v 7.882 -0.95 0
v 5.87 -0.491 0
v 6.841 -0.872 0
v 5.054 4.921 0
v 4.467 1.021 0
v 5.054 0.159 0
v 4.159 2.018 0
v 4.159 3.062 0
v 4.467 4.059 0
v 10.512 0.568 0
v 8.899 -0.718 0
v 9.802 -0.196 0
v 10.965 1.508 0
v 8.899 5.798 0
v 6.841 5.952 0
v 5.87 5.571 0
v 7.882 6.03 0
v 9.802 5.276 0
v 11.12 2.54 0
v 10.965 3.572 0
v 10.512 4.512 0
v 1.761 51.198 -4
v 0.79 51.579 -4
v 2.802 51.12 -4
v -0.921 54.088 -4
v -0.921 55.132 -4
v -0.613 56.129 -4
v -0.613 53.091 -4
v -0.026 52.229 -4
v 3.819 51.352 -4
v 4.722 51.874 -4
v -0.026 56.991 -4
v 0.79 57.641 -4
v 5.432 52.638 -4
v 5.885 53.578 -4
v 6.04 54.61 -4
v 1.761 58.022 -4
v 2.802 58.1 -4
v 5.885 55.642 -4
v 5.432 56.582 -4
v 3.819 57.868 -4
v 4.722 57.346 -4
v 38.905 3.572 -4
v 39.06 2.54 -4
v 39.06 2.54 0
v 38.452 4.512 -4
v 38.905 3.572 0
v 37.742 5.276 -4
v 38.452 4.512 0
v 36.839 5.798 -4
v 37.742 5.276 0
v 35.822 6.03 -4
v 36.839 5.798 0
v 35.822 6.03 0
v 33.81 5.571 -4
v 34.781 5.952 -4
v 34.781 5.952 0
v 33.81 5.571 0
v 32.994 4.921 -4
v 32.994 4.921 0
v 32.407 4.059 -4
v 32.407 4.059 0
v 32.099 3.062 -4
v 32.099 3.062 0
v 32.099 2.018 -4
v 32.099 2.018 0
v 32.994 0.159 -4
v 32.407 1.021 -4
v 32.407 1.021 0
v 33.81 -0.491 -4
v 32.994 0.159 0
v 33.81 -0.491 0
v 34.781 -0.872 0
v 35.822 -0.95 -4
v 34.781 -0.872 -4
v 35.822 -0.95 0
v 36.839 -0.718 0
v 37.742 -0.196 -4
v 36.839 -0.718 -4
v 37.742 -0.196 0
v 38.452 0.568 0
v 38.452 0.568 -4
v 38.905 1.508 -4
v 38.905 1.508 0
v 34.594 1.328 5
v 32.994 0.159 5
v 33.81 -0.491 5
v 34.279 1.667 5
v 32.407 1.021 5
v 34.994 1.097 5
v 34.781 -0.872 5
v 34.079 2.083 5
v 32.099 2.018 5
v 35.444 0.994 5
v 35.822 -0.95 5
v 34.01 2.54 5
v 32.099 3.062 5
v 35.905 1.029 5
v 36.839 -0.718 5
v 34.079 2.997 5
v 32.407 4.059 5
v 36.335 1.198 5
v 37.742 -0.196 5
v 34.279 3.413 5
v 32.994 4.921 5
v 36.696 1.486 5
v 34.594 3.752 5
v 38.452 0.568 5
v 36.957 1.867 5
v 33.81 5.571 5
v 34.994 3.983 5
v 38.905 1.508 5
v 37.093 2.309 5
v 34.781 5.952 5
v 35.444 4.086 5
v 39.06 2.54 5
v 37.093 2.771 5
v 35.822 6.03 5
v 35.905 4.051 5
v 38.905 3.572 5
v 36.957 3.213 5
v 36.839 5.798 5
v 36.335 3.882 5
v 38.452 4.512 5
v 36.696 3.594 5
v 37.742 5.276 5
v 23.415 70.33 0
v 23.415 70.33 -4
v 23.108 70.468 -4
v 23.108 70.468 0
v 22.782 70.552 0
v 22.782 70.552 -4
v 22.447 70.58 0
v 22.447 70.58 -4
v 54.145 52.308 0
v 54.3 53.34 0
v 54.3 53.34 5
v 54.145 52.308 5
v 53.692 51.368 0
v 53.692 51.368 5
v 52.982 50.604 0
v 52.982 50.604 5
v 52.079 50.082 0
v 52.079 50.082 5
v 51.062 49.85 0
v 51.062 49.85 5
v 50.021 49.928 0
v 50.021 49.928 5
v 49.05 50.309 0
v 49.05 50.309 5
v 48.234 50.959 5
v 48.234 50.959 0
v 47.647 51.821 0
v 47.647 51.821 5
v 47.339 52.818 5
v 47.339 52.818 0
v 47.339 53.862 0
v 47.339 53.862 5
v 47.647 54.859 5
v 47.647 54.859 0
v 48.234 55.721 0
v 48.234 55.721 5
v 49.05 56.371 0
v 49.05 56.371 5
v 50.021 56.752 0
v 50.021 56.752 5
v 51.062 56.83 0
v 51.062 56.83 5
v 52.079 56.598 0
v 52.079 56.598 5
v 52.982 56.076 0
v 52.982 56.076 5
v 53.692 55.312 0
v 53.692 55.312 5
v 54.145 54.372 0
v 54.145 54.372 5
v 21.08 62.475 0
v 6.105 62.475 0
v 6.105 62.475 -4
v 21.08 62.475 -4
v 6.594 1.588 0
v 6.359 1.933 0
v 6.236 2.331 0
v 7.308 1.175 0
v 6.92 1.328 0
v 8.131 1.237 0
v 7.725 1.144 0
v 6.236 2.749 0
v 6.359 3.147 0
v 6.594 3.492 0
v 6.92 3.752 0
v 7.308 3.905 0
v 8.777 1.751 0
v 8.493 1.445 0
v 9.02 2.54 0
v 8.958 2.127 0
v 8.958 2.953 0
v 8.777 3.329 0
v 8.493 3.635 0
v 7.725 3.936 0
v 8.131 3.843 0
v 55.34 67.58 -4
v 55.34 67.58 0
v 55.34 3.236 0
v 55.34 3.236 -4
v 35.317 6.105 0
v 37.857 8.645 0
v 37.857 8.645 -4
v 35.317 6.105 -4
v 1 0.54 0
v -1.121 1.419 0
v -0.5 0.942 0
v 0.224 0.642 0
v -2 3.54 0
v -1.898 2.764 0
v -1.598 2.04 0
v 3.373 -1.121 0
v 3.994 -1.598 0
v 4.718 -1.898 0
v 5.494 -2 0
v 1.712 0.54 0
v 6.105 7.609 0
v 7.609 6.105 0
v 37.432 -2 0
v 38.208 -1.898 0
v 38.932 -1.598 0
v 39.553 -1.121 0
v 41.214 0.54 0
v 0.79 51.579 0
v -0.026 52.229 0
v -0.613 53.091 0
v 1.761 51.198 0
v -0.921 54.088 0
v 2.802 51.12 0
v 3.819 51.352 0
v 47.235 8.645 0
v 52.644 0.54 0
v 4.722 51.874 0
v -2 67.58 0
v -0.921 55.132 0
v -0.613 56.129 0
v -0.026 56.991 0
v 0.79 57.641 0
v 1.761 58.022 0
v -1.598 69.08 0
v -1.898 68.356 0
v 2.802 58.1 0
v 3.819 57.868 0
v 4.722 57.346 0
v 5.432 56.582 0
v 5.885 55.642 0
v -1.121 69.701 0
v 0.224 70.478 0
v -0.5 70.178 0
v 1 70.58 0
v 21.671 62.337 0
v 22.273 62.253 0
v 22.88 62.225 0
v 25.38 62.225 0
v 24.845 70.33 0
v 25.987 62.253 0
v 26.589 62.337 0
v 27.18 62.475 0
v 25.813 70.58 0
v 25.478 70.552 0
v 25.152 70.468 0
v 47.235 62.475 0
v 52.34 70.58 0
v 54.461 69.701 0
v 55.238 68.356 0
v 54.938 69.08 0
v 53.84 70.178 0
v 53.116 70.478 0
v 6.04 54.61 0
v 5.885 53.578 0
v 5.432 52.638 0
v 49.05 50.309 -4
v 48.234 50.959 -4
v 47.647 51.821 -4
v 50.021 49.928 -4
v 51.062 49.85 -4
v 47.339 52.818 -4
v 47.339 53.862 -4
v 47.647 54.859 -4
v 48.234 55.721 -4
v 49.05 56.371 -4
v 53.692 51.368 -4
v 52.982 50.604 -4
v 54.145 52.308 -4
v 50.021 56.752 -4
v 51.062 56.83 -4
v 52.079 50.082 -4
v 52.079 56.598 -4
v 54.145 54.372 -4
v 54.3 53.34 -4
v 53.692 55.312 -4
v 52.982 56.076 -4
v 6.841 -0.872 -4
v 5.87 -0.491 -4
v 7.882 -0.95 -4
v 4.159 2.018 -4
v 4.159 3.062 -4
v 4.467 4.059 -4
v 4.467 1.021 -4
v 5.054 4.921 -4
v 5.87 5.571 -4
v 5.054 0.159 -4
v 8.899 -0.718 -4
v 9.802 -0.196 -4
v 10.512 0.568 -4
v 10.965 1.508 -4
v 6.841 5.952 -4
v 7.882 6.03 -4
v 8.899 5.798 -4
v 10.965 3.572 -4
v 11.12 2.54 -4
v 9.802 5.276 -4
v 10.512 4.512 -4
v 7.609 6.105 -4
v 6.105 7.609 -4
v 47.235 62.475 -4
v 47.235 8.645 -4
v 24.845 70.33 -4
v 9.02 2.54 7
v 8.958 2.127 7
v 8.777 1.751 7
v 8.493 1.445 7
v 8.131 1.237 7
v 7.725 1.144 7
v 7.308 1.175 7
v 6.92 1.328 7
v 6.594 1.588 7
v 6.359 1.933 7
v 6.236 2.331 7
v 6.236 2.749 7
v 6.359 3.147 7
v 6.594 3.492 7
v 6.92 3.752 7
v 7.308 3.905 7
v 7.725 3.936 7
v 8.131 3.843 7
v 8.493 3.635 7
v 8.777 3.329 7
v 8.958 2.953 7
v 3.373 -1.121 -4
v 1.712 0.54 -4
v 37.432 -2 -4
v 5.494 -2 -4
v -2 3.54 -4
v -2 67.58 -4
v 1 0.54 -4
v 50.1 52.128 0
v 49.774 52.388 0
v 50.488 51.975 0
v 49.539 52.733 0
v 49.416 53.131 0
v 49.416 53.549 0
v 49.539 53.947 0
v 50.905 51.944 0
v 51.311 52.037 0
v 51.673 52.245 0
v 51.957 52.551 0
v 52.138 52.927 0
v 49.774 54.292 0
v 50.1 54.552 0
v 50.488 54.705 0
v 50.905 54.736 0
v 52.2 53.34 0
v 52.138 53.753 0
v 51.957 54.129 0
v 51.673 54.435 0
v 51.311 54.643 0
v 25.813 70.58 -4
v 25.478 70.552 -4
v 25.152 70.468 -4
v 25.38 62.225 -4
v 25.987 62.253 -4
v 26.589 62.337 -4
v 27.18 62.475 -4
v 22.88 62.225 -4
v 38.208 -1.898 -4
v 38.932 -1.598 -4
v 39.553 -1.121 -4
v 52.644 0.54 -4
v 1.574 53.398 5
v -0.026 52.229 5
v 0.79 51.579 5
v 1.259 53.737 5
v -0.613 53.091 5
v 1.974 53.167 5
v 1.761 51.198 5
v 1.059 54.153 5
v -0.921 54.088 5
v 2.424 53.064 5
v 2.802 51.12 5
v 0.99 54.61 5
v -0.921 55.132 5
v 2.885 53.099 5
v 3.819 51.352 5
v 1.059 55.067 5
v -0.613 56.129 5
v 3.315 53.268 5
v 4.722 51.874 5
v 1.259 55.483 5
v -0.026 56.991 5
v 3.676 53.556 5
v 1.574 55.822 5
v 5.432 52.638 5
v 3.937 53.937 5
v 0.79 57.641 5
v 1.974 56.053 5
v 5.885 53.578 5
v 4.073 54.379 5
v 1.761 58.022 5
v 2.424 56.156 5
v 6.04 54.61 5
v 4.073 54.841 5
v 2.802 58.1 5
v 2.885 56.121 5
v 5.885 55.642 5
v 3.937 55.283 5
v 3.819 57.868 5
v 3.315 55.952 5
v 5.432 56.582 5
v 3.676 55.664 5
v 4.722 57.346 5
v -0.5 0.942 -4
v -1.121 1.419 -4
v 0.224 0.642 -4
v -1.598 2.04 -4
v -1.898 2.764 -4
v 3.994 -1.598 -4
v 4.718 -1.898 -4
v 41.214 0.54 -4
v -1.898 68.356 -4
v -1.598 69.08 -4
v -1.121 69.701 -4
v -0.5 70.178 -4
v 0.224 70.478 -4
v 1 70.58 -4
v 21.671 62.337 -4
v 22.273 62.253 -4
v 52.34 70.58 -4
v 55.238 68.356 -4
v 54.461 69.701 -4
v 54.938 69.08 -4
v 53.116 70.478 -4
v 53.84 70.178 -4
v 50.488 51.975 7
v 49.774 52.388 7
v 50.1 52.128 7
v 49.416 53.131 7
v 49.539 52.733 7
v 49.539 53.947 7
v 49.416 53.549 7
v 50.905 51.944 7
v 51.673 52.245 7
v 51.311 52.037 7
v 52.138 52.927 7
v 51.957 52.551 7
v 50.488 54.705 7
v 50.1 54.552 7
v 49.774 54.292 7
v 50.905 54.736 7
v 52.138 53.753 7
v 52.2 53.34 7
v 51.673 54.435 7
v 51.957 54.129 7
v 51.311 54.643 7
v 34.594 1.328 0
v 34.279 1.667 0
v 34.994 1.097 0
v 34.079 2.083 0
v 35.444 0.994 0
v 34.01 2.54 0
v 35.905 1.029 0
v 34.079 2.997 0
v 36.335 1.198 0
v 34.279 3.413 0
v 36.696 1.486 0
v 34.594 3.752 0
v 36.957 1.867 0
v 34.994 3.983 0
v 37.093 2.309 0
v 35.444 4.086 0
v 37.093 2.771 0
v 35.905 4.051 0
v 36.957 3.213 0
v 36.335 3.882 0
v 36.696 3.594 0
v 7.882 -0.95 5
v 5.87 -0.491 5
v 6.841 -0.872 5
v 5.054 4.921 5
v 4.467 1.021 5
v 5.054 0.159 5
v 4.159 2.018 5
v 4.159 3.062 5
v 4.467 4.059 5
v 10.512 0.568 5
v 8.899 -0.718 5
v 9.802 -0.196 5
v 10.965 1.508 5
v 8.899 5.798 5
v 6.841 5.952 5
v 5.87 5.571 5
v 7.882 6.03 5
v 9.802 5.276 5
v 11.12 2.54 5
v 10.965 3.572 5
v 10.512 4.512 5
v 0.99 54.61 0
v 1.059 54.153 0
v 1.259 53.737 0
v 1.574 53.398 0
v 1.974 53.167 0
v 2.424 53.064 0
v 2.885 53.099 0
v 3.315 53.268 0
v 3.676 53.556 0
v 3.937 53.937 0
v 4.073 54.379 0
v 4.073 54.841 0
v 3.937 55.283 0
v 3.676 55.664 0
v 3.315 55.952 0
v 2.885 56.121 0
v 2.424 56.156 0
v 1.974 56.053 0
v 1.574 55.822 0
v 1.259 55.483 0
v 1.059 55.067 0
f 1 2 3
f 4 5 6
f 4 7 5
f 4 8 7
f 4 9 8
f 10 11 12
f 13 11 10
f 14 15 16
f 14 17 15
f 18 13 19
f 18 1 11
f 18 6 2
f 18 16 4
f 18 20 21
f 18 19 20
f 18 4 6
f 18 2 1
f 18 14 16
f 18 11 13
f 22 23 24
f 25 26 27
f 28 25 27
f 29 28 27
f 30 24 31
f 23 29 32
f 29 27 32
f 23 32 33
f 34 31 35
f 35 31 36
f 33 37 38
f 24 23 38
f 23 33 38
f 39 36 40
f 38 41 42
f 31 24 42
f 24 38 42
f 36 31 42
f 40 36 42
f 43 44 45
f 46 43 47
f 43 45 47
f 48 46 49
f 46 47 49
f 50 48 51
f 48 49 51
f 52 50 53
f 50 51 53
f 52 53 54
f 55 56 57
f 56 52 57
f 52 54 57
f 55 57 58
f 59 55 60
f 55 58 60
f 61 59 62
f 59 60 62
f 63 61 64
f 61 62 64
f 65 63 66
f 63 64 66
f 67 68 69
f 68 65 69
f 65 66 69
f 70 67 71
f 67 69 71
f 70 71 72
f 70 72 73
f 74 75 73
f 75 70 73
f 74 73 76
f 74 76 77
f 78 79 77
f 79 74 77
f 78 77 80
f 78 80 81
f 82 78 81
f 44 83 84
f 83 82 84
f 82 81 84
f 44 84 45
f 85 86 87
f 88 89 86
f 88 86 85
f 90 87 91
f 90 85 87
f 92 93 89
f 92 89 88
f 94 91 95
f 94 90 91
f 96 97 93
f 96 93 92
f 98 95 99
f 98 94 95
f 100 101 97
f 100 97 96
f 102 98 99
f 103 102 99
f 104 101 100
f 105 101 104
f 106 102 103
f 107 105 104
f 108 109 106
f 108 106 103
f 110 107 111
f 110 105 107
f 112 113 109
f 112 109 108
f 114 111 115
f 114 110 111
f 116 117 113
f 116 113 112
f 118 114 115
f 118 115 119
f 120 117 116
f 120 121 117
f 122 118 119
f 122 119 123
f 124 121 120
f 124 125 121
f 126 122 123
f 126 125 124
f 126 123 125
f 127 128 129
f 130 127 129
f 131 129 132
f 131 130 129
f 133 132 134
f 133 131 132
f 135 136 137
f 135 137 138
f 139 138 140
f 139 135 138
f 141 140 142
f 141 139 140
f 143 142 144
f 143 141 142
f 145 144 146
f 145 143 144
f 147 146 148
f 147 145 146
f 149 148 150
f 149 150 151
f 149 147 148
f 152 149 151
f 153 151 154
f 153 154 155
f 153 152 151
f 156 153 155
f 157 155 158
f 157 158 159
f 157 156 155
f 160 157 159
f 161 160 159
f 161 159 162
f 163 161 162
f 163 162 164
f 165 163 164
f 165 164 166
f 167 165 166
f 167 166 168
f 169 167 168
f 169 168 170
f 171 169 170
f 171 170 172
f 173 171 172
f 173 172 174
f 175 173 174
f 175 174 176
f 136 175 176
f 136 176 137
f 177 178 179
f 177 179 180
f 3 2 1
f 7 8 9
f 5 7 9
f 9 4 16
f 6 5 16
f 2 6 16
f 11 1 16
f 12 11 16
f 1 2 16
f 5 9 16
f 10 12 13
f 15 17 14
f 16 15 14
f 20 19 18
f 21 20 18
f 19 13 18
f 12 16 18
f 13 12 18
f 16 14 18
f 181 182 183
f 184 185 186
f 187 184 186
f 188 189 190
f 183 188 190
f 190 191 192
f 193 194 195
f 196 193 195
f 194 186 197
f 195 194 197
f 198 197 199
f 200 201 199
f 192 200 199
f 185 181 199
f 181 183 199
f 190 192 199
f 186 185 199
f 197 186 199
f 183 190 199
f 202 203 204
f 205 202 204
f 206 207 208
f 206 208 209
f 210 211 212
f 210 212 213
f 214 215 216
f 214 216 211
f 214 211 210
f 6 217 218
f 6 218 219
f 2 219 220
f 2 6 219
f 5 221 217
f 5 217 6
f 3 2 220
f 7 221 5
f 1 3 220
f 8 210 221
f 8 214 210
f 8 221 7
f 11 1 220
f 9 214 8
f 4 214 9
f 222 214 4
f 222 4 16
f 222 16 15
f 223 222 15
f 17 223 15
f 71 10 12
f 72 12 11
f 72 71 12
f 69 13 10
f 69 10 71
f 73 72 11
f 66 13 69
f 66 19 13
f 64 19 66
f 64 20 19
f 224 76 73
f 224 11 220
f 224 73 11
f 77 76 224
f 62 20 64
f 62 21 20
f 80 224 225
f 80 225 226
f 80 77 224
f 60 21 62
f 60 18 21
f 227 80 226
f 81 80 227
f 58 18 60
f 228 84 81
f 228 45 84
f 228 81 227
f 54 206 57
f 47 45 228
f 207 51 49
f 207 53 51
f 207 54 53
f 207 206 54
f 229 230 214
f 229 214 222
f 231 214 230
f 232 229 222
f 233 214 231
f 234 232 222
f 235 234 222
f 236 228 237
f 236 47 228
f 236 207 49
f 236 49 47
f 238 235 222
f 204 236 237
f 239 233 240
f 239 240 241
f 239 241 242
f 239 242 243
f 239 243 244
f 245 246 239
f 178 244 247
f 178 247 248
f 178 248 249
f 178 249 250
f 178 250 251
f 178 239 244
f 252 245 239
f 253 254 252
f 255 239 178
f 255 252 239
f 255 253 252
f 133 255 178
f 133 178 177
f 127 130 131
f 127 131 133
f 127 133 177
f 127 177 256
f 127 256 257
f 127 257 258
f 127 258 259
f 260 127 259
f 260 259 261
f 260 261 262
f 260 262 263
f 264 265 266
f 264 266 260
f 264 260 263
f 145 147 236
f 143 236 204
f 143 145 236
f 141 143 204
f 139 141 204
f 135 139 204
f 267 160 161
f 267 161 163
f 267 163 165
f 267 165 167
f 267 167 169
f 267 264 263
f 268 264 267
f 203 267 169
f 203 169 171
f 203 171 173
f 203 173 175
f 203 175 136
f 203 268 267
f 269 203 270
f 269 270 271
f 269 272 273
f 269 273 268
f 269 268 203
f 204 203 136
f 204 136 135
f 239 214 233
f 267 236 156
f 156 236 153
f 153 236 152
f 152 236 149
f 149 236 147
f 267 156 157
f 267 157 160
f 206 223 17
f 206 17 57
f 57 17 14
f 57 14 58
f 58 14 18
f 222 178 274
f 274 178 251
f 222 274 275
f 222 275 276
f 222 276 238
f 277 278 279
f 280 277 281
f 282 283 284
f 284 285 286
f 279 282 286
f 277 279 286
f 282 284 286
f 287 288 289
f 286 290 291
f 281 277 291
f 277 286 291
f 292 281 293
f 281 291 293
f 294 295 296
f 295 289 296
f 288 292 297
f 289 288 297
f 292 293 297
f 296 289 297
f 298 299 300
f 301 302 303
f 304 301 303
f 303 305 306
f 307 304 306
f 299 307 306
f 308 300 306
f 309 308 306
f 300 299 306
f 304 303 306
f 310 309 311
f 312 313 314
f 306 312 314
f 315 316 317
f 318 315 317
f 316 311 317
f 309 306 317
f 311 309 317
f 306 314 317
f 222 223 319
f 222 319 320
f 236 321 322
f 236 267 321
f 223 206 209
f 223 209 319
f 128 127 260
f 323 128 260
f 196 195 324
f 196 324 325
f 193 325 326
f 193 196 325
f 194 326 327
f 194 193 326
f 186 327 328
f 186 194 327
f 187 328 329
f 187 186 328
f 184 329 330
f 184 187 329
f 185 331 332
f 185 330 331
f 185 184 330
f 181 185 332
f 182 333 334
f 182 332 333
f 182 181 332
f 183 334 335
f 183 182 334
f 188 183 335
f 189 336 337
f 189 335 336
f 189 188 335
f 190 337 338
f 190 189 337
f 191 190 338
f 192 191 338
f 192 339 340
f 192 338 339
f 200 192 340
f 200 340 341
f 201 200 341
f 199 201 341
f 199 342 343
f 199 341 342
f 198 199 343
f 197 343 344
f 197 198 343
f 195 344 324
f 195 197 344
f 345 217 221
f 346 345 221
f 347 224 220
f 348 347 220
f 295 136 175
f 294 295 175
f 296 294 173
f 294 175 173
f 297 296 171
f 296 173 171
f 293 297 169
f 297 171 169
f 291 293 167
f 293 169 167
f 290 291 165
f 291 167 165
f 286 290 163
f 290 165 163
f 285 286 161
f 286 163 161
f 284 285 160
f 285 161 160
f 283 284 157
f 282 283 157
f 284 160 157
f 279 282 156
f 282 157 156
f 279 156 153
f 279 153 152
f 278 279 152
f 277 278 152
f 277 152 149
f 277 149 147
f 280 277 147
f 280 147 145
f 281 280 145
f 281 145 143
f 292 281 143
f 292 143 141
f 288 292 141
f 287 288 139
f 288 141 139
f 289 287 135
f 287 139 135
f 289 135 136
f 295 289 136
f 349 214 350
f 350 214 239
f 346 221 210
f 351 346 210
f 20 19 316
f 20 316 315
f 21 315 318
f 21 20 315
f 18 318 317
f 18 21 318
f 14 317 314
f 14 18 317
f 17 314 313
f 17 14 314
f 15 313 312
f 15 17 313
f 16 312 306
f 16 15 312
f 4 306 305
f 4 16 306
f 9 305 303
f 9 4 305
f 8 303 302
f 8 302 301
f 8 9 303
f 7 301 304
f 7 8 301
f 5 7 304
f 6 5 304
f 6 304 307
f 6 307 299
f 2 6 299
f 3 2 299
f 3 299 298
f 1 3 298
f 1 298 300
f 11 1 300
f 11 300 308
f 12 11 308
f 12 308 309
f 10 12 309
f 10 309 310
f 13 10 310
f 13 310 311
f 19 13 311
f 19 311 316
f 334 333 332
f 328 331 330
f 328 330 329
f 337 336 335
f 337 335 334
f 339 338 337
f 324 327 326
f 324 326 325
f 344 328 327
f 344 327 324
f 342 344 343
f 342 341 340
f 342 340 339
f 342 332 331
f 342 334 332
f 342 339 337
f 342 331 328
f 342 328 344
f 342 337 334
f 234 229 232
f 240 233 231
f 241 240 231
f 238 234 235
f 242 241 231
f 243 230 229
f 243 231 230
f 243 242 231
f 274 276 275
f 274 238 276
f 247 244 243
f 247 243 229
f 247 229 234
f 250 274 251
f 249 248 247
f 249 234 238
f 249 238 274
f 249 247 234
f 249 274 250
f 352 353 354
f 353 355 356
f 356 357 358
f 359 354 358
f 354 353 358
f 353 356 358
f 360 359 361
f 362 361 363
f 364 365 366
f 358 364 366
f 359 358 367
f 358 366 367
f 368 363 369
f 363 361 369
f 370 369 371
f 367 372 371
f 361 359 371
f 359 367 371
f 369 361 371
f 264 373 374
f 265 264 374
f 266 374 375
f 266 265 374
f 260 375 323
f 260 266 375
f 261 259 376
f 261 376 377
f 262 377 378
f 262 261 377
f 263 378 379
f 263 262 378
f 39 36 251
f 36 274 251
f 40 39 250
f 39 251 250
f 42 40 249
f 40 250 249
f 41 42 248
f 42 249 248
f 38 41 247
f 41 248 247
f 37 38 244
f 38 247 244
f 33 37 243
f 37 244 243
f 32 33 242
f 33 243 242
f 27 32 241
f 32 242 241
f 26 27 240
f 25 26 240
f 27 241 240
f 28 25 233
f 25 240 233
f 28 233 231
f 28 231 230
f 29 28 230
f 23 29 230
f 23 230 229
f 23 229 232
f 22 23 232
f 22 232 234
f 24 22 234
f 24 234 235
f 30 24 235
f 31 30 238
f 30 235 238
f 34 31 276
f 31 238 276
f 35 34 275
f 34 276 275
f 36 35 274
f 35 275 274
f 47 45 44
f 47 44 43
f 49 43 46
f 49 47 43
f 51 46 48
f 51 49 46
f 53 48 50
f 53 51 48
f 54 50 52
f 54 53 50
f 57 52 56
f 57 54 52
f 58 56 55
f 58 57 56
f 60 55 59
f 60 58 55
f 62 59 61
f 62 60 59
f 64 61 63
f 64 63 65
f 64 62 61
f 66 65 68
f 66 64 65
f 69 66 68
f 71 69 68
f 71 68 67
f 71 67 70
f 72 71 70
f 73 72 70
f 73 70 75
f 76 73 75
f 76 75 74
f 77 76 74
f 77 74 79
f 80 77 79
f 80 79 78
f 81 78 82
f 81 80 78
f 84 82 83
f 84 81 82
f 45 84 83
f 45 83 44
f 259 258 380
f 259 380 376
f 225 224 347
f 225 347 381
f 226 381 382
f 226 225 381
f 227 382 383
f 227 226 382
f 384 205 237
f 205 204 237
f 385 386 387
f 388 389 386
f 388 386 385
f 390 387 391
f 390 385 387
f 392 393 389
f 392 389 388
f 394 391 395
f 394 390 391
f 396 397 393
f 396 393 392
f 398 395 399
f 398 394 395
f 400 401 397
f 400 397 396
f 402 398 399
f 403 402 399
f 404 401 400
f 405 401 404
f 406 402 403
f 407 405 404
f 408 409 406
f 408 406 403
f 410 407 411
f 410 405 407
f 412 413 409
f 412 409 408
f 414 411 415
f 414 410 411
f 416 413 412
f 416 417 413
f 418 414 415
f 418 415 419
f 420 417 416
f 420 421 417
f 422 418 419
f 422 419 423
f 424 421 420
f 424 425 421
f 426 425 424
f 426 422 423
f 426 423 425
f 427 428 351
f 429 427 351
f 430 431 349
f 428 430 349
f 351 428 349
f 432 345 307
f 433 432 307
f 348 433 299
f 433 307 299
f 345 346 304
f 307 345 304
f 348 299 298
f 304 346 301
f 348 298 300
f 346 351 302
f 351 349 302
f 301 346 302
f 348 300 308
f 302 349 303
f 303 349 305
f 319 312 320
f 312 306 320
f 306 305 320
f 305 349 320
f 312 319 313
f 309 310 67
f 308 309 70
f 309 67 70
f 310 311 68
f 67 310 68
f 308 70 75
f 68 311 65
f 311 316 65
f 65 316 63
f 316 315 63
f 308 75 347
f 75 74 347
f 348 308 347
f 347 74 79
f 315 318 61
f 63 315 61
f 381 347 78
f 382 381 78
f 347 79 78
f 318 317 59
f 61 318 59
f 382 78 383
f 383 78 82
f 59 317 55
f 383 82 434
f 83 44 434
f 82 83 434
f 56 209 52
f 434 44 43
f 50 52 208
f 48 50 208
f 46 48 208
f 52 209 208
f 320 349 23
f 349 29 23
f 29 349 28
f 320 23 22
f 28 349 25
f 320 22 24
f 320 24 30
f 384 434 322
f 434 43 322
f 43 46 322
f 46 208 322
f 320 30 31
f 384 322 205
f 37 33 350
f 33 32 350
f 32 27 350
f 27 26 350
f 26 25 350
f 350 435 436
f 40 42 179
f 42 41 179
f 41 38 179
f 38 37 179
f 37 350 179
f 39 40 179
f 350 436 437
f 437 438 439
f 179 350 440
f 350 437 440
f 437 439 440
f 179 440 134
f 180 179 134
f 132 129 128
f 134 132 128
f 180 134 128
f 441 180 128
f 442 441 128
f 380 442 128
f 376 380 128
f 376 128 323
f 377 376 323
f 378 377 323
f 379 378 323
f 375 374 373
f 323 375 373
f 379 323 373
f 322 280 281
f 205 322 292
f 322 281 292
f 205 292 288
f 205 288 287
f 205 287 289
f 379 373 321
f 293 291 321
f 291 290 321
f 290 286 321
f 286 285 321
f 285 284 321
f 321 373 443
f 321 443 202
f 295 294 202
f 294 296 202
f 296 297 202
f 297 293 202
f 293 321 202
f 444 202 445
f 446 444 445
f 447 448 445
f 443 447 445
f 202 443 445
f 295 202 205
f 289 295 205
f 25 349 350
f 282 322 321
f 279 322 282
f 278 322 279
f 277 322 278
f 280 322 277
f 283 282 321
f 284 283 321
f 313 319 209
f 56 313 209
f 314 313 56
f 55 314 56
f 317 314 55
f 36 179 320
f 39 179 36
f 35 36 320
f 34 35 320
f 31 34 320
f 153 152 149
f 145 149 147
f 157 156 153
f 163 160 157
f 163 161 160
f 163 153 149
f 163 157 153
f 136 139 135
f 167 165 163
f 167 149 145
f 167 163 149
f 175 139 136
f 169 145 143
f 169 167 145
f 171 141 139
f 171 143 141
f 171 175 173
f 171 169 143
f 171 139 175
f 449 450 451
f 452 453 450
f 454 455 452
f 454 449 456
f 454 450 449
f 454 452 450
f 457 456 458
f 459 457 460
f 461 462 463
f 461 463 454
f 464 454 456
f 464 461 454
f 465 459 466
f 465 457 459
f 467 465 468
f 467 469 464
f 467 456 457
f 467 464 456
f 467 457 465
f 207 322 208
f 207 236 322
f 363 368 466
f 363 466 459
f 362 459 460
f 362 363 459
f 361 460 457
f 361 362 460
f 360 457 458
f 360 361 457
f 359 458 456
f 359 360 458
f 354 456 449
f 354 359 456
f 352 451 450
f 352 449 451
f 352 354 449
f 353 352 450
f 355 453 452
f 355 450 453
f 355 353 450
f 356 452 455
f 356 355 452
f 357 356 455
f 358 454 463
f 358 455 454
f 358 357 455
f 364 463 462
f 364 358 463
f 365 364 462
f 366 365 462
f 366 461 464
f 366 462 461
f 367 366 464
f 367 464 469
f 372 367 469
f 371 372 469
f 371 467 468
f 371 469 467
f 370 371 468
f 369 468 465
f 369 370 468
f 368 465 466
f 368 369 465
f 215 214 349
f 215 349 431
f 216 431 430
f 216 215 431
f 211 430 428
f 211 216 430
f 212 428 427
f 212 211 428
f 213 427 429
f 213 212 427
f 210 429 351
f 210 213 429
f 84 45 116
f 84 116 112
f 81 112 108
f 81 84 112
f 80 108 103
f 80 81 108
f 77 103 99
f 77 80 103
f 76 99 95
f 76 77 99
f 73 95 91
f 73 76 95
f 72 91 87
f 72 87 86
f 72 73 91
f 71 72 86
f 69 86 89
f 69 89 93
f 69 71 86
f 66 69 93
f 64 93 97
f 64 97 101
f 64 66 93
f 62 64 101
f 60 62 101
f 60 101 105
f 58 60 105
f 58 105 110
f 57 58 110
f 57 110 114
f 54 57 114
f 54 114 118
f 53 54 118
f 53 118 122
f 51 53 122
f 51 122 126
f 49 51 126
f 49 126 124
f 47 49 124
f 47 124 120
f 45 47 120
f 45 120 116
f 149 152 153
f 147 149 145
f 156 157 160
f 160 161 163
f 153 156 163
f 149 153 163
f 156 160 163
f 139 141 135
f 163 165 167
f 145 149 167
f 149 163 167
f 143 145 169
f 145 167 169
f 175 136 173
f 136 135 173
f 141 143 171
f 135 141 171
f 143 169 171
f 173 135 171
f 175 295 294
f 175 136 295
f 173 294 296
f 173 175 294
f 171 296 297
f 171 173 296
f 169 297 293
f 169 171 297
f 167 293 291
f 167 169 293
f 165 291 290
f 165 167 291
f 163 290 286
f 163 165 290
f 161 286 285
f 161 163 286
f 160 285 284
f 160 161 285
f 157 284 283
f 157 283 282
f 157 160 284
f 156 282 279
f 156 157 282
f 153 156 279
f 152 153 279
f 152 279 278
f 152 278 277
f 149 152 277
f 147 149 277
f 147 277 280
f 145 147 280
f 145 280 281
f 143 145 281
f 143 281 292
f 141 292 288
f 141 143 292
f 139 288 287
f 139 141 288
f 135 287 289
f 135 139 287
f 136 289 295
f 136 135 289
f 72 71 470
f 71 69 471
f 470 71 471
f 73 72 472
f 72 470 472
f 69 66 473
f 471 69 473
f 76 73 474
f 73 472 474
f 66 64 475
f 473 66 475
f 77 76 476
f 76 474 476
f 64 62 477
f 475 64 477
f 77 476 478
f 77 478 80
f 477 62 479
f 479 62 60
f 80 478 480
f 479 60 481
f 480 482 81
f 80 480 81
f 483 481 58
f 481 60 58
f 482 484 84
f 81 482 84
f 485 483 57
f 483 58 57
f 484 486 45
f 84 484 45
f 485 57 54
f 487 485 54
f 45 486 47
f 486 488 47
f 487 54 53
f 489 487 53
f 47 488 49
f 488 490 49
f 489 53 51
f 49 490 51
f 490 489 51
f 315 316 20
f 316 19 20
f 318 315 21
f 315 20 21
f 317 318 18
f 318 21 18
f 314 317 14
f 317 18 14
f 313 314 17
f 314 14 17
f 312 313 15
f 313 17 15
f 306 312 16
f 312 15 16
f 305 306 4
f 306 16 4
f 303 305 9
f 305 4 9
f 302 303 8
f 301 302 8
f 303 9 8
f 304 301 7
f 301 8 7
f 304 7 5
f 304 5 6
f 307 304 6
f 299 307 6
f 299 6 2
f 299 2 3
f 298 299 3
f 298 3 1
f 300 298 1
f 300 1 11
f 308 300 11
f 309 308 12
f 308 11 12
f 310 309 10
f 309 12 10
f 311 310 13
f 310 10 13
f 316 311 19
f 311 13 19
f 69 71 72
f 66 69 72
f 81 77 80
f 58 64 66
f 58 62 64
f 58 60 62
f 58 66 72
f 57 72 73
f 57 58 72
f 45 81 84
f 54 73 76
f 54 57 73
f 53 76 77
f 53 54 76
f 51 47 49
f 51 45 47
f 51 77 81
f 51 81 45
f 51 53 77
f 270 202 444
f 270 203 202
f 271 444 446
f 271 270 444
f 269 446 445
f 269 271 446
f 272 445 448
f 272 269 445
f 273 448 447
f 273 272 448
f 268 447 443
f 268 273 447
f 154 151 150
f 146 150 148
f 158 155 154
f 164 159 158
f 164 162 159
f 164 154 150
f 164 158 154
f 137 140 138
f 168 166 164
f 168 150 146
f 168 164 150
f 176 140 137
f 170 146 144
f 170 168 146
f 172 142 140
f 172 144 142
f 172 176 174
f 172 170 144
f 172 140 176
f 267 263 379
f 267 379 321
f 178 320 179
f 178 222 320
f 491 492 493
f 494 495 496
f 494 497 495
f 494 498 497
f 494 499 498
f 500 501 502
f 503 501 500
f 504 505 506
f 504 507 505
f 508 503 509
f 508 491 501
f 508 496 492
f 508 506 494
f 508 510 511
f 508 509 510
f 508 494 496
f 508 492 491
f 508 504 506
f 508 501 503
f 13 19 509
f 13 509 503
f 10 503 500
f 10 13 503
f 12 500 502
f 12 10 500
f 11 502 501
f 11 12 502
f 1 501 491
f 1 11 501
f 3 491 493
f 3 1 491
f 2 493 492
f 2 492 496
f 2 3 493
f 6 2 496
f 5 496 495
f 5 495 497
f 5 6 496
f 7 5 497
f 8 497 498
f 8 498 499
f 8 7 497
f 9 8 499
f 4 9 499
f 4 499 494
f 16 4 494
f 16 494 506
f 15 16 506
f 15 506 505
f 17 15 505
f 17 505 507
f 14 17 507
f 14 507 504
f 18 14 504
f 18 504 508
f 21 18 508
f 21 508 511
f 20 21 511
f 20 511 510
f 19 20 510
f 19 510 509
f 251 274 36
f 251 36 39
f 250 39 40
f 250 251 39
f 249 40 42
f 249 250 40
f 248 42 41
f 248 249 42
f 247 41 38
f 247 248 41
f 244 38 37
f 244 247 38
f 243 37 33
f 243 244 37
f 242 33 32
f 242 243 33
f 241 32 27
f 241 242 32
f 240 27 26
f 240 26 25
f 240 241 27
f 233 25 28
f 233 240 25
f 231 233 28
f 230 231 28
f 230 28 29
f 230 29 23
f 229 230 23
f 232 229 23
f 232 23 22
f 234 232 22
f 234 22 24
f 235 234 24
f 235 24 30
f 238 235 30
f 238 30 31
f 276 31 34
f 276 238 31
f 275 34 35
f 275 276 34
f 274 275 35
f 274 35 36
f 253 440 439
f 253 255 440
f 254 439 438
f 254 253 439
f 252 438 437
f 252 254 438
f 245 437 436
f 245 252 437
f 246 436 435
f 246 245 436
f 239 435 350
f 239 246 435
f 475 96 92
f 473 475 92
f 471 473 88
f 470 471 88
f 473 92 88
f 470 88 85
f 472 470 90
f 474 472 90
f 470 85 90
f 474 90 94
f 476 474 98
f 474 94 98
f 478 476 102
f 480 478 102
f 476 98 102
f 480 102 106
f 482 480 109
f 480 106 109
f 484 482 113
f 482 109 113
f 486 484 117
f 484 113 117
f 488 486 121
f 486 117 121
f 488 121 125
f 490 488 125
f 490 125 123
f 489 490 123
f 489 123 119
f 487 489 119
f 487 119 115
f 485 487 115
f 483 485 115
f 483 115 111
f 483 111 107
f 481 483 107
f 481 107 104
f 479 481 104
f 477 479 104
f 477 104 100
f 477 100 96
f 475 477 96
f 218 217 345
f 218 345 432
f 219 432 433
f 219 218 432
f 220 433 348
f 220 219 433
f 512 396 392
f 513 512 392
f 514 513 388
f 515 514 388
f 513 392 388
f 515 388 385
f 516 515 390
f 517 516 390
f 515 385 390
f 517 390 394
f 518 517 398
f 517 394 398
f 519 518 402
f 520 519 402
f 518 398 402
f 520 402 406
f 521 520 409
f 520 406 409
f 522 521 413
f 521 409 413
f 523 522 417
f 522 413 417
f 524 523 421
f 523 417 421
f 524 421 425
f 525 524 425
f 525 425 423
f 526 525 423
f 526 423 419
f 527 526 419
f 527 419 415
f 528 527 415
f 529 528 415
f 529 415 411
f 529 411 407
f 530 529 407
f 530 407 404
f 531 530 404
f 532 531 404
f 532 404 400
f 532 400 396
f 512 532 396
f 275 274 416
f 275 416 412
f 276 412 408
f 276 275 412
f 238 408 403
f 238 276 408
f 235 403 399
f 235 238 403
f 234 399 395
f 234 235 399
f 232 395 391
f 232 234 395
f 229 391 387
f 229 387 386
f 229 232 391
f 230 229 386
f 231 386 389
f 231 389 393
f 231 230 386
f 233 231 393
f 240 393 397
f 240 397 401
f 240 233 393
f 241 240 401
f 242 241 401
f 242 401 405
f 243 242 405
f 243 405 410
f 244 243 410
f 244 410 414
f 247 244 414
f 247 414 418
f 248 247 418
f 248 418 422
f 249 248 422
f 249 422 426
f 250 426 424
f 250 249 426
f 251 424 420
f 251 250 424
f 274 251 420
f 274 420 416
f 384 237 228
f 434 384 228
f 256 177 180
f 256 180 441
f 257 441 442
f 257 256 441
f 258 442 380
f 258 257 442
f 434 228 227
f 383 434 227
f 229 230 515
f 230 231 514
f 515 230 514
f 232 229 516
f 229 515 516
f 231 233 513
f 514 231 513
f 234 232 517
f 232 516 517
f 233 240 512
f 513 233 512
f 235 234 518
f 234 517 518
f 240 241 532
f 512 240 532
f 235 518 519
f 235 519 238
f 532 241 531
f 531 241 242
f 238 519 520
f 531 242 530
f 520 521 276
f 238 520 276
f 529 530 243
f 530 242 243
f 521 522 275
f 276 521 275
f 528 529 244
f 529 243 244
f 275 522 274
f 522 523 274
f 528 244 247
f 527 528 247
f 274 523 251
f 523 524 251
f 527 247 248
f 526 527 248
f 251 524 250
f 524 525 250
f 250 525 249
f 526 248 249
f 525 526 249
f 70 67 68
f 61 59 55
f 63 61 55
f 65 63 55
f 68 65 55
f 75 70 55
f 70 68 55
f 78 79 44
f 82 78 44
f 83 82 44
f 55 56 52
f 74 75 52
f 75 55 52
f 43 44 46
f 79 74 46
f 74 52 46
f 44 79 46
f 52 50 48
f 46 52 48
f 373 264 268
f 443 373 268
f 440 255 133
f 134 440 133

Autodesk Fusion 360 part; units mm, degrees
sketch "Sketch1" plane through (0, 0, 0) normal (0, 0, 1) x (1, 0, 0)
  arc A0 (38.1389, 0.2929) -> (37.4318, 0) centre (37.4318, 1) cw
  line L0 (53.34, 67.58) -> (53.34, 4.064)
  arc A1 (22.447, 68.58) -> (22.88, 68.33) centre (22.88, 68.83) ccw
  line L1 (25.813, 68.58) -> (52.34, 68.58)
  line L2 (1, 68.58) -> (22.447, 68.58)
  line L3 (0, 3.54) -> (0, 67.58)
  arc A2 (5.4942, 0) -> (4.7871, 0.2929) centre (5.4942, 1) cw
  line L4 (40.386, 2.54) -> (38.1389, 0.2929)
  line L5 (4.7871, 0.2929) -> (2.54, 2.54)
  line L6 (22.88, 68.33) -> (25.38, 68.33)
  line L7 (37.4318, 0) -> (5.4942, 0)
  line L8 (2.54, 2.54) -> (1, 2.54)
  arc A3 (52.34, 68.58) -> (53.34, 67.58) centre (52.34, 67.58) cw
  line L9 (51.816, 2.54) -> (40.386, 2.54)
  arc A4 (0, 67.58) -> (1, 68.58) centre (1, 67.58) cw
  arc A5 (25.38, 68.33) -> (25.813, 68.58) centre (25.38, 68.83) ccw
  line L10 (53.34, 4.064) -> (51.816, 2.54)
  arc A6 (1, 2.54) -> (0, 3.54) centre (1, 3.54) cw
  circle A7 centre (2.54, 54.61) radius 1.55
  circle A8 centre (50.8, 53.34) radius 1.4
  circle A9 centre (35.56, 2.54) radius 1.55
  circle A10 centre (7.62, 2.54) radius 1.4
  line L11 (23.4152, 70.33) -> (24.8448, 70.33)
  arc A11 (25.813, 70.58) -> (24.8448, 70.33) centre (25.813, 68.58) ccw
  line L12 (25.813, 70.58) -> (52.34, 70.58)
  arc A12 (55.34, 67.58) -> (52.34, 70.58) centre (52.34, 67.58) ccw
  line L13 (55.34, 67.58) -> (55.34, 3.2356)
  line L14 (55.34, 3.2356) -> (52.6444, 0.54)
  line L15 (52.6444, 0.54) -> (41.2144, 0.54)
  line L16 (41.2144, 0.54) -> (39.5531, -1.1213)
  arc A13 (37.4318, -2) -> (39.5531, -1.1213) centre (37.4318, 1) ccw
  line L17 (37.4318, -2) -> (5.4942, -2)
  arc A14 (3.3729, -1.1213) -> (5.4942, -2) centre (5.4942, 1) ccw
  line L18 (3.3729, -1.1213) -> (1.7116, 0.54)
  line L19 (1.7116, 0.54) -> (1, 0.54)
  arc A15 (-2, 3.54) -> (1, 0.54) centre (1, 3.54) ccw
  line L20 (-2, 3.54) -> (-2, 67.58)
  arc A16 (1, 70.58) -> (-2, 67.58) centre (1, 67.58) ccw
  line L21 (1, 70.58) -> (22.447, 70.58)
  arc A17 (23.4152, 70.33) -> (22.447, 70.58) centre (22.447, 68.58) ccw
  circle A18 centre (50.8, 53.34) radius 3.5
  circle A19 centre (35.56, 2.54) radius 3.5
  circle A20 centre (7.62, 2.54) radius 3.5
  circle A21 centre (2.54, 54.61) radius 3.5
  line L22 (47.2351, 62.4751) -> (47.2351, 8.6449)
  line L23 (47.2351, 8.6449) -> (37.8573, 8.6449)
  line L24 (37.8573, 8.6449) -> (35.3173, 6.1049)
  line L25 (35.3173, 6.1049) -> (7.6087, 6.1049)
  line L26 (7.6087, 6.1049) -> (6.1049, 7.6087)
  line L27 (6.1049, 7.6087) -> (6.1049, 62.4751)
  line L28 (6.1049, 62.4751) -> (21.08, 62.4751)
  arc A22 (21.08, 62.4751) -> (22.88, 62.2251) centre (22.88, 68.83) ccw
  line L29 (22.88, 62.2251) -> (25.38, 62.2251)
  arc A23 (25.38, 62.2251) -> (27.18, 62.4751) centre (25.38, 68.83) ccw
  line L30 (27.18, 62.4751) -> (47.2351, 62.4751)
  dimension "d1" = 3.1
  dimension "d2" = 2.8
  dimension "d3" = 2.8
  dimension "d8" = -2
  dimension "d9" = 7
  dimension "d10" = 7
  dimension "d11" = 3.1
  dimension "d12" = 7
  dimension "d13" = 7
  dimension "d14" = 6.1049
extrude "Extrude2" add sketch "Sketch1" along normal blind 5 contours A0 L4 L7 A19 | A0 L4 L7 A19 | A2 L7 A20 | A2 L7 A20 | L0 A18 | L0 A18 | L3 A21 | L3 A21 | A7 | A8 | A9 | A10 makes body 1 at (11.1156, 2.7145, 1.6667) makes body 2 at (6.0226, 54.2615, 1.6667) makes body 3 at (39.0426, 2.8885, 3.3333) makes body 4 at (54.2826, 53.6885, 3.3333)
extrude "Extrude3" add sketch "Sketch1" along normal blind 7 separate body contours A8 | A10 makes body 5 at (49.6054, 52.61, 4.6667) makes body 6 at (9.0183, 2.4702, 4.6667)
extrude "Extrude4" add sketch "Sketch1" against normal blind 4 separate body contours L0 A1 L1 L2 L3 A2 L4 L5 L6 L7 L8 A3 L9 A4 A5 L10 A6 A18 A19 A20 A21 | L11 A11 L12 A12 L13 L14 L15 L16 A13 L17 A14 L18 L19 A15 L20 A16 L21 A17 makes body 7
sketch "Sketch2" plane through (0, 0, 5) normal (0, 0, 1) x (-1, 0, 0)
  circle A0 centre (-2.54, -54.61) radius 3.5
  circle A1 centre (-2.54, -54.61) radius 1.55
  dimension "d21" = 3.1
extrude "Extrude5" cut sketch "Sketch2" against normal blind 5 contours A1 bodies 2
sketch "Sketch3" plane through (0, 0, 5) normal (0, 0, 1) x (-1, 0, 0)
  circle A0 centre (-35.56, -2.54) radius 3.5
  circle A1 centre (-35.56, -2.54) radius 1.55
  dimension "d24" = 3.1
extrude "Extrude6" cut sketch "Sketch3" against normal blind 5 contours A1 bodies 3
extrude "Extrude7" add sketch "Sketch1" against normal up to surface (4 mm away) separate body contours A0 L4 L7 A19 | A0 L4 L7 A19 | A2 L7 A20 | A2 L7 A20 | L0 A18 | L0 A18 | L3 A21 | L3 A21 | A7 | A8 | A9 | A10 makes body 8 at (11.1026, 2.1915, -1.3333) makes body 9 at (6.0356, 54.4355, -2.6667) makes body 10 at (39.0426, 2.8885, -1.3333) makes body 11 at (54.2826, 53.6885, -1.3333)
equation "d1 = d11"
equation "d2 = d3"
equation "MountHeight = 5 mm"
equation "d10 = d9"
equation "d12 = d9"
equation "d13 = d9"
equation "d15 = MountHeight"
equation "d17 = MountHeight + 2 mm"
